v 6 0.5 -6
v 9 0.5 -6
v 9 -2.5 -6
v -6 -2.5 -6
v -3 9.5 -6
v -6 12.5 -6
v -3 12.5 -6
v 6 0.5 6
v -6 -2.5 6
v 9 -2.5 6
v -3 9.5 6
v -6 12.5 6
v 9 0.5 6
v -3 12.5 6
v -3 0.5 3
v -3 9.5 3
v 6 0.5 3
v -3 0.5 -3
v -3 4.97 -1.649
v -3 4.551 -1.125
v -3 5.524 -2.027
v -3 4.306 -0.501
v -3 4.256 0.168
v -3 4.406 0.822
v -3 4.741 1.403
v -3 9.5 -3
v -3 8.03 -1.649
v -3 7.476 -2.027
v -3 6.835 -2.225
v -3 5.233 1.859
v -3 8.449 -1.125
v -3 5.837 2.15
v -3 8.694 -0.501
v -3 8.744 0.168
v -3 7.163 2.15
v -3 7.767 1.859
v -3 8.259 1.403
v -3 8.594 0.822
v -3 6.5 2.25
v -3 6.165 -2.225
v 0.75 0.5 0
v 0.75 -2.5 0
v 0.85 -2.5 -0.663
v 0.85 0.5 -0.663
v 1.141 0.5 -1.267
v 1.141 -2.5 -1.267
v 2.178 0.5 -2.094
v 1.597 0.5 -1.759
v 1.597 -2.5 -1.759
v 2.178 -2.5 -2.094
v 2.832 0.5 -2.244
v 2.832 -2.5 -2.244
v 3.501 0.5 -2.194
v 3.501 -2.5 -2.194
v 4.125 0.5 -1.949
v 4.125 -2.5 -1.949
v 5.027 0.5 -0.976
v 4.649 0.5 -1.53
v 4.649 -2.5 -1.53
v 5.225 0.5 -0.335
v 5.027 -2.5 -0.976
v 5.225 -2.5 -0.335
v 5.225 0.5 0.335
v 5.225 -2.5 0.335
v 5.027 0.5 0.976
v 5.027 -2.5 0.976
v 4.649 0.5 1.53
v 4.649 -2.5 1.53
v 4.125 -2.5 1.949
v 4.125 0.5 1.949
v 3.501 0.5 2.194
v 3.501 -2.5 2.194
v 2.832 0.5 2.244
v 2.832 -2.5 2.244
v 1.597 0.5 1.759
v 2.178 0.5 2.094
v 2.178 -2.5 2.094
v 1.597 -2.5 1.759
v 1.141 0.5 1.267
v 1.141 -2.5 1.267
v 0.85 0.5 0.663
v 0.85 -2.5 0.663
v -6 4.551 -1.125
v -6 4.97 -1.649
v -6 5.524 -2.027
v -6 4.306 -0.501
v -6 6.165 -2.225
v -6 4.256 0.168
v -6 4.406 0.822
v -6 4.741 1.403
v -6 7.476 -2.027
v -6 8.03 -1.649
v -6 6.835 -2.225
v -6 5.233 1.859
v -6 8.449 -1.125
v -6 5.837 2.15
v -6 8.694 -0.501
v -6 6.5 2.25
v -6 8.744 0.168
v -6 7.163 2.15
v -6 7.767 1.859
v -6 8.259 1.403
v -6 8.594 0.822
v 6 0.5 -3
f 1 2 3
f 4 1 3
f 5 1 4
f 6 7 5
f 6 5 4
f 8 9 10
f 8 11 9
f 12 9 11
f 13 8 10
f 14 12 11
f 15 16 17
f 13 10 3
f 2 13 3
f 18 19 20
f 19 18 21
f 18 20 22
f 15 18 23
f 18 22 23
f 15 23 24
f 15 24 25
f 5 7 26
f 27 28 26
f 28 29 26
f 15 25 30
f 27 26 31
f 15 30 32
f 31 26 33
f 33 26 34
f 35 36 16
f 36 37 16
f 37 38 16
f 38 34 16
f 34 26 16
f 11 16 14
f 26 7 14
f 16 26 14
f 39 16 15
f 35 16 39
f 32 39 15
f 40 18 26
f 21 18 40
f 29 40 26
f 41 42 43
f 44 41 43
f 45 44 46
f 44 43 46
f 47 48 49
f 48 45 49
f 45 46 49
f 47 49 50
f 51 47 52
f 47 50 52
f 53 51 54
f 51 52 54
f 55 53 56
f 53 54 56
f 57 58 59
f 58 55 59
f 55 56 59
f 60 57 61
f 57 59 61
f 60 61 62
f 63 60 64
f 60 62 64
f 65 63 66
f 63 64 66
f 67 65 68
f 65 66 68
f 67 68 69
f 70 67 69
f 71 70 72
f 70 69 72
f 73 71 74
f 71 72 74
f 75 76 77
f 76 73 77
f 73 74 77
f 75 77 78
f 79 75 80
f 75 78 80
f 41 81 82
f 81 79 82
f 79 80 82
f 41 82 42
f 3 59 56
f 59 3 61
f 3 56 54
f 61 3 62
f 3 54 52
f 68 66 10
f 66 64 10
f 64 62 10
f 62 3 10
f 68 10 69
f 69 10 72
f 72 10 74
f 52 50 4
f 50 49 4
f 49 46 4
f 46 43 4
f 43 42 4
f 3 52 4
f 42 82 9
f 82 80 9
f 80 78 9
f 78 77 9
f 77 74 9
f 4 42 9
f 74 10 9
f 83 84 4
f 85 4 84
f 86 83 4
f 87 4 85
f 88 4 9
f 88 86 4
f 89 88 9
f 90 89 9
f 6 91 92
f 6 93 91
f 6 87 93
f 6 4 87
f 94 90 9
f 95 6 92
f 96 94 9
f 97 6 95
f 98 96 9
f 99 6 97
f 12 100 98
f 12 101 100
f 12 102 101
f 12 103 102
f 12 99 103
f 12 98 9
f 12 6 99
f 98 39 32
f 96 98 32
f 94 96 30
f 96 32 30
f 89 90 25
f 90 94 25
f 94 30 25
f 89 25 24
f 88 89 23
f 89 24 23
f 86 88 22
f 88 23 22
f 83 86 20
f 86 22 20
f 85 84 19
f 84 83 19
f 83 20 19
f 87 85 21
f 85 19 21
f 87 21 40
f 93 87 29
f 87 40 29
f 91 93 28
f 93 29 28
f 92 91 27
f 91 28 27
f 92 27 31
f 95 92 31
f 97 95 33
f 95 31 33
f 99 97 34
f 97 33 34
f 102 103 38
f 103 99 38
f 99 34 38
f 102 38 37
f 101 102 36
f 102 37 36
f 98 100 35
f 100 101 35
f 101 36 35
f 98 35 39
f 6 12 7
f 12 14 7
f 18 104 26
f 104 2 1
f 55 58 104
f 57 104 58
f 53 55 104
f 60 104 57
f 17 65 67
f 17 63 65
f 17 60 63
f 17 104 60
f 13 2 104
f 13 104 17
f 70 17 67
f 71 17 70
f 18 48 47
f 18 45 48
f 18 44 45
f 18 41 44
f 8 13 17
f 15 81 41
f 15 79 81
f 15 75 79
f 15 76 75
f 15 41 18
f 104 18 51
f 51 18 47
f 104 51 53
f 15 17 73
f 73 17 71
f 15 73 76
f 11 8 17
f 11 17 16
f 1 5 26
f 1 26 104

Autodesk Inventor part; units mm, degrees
ref_plane "YZ Plane" through (0, 0, 0) normal (1, 0, 0) x (0, 1, 0)
ref_plane "XZ Plane" through (0, 0, 0) normal (0, 1, 0) x (-1, 0, 0)
ref_plane "XY Plane" through (0, 0, 0) normal (0, 0, 1) x (1, 0, 0)
sketch "Boceto1" plane through (0, 0, 0) normal (0, 1, 0) x (-1, 0, 0)
  circle A0 centre (0, 0) radius 1.5
  line L0 (4, 4) -> (-4, 4)
  line L1 (-4, 4) -> (-4, -4)
  line L2 (-4, -4) -> (4, -4)
  line L3 (4, -4) -> (4, 4)
  dimension "d0" = 3
extrude "Extrusión1" add sketch "Boceto1" along normal blind 2
sketch "Boceto2" plane through (-4, 0, -4) normal (-1, 0, 0) x (0, 0, 1)
  circle A0 centre (4, 6) radius 1.5
  line L0 (8, 2) -> (8, 10)
  line L1 (8, 10) -> (0, 10)
  line L2 (0, 10) -> (0, 2)
  line L3 (8, 0) -> (0, 0) projected
  line L4 (0, 0) -> (8, 0)
  line L5 (8, 0) -> (8, 2)
  line L6 (0, 2) -> (0, 0)
  line L7 (0, 0) -> (8, 0)
  line L8 (8, 0) -> (8, 10)
  line L9 (8, 10) -> (0, 10)
  line L10 (0, 10) -> (0, 0)
  point P0 (4, 0)
extrude "Extrusión2" add sketch "Boceto2" along normal blind 2
sketch "Boceto3" plane through (4, 0, 4) normal (0, 0, 1) x (1, 0, 0)
  line L0 (-8, 2) -> (-8, 10) projected
  line L1 (-8, 10) -> (-8, 8)
  line L2 (0, 2) -> (-2, 2)
  line L3 (-2, 2) -> (-8, 8)
  line L4 (-2, 2) -> (-8, 2)
  line L5 (-8, 8) -> (-8, 2)
  point P0 (-5.5, 2)
  point P1 (-8, 4.5)
  dimension "d26" = 2
  dimension "d27" = 2
extrude "Extrusión8" add sketch "Boceto3" against normal blind 2
sketch "Boceto9" plane through (4, 0, -4) normal (0, 0, -1) x (-1, 0, 0)
  line L0 (0, 2) -> (8, 2) projected
  line L1 (8, 8) -> (2, 2) projected
  line L2 (2, 2) -> (8, 8)
  line L3 (8, 8) -> (8, 2)
  line L4 (8, 2) -> (2, 2)
  point P0 (4, 0)
extrude "Extrusión9" add sketch "Boceto9" against normal blind 2
scale "Escala1" factors (1.5, 1.5, 1.5) then translate (3, -2.5, 0) bodies 1
properties part number "Base auxiliar - esquadra"
